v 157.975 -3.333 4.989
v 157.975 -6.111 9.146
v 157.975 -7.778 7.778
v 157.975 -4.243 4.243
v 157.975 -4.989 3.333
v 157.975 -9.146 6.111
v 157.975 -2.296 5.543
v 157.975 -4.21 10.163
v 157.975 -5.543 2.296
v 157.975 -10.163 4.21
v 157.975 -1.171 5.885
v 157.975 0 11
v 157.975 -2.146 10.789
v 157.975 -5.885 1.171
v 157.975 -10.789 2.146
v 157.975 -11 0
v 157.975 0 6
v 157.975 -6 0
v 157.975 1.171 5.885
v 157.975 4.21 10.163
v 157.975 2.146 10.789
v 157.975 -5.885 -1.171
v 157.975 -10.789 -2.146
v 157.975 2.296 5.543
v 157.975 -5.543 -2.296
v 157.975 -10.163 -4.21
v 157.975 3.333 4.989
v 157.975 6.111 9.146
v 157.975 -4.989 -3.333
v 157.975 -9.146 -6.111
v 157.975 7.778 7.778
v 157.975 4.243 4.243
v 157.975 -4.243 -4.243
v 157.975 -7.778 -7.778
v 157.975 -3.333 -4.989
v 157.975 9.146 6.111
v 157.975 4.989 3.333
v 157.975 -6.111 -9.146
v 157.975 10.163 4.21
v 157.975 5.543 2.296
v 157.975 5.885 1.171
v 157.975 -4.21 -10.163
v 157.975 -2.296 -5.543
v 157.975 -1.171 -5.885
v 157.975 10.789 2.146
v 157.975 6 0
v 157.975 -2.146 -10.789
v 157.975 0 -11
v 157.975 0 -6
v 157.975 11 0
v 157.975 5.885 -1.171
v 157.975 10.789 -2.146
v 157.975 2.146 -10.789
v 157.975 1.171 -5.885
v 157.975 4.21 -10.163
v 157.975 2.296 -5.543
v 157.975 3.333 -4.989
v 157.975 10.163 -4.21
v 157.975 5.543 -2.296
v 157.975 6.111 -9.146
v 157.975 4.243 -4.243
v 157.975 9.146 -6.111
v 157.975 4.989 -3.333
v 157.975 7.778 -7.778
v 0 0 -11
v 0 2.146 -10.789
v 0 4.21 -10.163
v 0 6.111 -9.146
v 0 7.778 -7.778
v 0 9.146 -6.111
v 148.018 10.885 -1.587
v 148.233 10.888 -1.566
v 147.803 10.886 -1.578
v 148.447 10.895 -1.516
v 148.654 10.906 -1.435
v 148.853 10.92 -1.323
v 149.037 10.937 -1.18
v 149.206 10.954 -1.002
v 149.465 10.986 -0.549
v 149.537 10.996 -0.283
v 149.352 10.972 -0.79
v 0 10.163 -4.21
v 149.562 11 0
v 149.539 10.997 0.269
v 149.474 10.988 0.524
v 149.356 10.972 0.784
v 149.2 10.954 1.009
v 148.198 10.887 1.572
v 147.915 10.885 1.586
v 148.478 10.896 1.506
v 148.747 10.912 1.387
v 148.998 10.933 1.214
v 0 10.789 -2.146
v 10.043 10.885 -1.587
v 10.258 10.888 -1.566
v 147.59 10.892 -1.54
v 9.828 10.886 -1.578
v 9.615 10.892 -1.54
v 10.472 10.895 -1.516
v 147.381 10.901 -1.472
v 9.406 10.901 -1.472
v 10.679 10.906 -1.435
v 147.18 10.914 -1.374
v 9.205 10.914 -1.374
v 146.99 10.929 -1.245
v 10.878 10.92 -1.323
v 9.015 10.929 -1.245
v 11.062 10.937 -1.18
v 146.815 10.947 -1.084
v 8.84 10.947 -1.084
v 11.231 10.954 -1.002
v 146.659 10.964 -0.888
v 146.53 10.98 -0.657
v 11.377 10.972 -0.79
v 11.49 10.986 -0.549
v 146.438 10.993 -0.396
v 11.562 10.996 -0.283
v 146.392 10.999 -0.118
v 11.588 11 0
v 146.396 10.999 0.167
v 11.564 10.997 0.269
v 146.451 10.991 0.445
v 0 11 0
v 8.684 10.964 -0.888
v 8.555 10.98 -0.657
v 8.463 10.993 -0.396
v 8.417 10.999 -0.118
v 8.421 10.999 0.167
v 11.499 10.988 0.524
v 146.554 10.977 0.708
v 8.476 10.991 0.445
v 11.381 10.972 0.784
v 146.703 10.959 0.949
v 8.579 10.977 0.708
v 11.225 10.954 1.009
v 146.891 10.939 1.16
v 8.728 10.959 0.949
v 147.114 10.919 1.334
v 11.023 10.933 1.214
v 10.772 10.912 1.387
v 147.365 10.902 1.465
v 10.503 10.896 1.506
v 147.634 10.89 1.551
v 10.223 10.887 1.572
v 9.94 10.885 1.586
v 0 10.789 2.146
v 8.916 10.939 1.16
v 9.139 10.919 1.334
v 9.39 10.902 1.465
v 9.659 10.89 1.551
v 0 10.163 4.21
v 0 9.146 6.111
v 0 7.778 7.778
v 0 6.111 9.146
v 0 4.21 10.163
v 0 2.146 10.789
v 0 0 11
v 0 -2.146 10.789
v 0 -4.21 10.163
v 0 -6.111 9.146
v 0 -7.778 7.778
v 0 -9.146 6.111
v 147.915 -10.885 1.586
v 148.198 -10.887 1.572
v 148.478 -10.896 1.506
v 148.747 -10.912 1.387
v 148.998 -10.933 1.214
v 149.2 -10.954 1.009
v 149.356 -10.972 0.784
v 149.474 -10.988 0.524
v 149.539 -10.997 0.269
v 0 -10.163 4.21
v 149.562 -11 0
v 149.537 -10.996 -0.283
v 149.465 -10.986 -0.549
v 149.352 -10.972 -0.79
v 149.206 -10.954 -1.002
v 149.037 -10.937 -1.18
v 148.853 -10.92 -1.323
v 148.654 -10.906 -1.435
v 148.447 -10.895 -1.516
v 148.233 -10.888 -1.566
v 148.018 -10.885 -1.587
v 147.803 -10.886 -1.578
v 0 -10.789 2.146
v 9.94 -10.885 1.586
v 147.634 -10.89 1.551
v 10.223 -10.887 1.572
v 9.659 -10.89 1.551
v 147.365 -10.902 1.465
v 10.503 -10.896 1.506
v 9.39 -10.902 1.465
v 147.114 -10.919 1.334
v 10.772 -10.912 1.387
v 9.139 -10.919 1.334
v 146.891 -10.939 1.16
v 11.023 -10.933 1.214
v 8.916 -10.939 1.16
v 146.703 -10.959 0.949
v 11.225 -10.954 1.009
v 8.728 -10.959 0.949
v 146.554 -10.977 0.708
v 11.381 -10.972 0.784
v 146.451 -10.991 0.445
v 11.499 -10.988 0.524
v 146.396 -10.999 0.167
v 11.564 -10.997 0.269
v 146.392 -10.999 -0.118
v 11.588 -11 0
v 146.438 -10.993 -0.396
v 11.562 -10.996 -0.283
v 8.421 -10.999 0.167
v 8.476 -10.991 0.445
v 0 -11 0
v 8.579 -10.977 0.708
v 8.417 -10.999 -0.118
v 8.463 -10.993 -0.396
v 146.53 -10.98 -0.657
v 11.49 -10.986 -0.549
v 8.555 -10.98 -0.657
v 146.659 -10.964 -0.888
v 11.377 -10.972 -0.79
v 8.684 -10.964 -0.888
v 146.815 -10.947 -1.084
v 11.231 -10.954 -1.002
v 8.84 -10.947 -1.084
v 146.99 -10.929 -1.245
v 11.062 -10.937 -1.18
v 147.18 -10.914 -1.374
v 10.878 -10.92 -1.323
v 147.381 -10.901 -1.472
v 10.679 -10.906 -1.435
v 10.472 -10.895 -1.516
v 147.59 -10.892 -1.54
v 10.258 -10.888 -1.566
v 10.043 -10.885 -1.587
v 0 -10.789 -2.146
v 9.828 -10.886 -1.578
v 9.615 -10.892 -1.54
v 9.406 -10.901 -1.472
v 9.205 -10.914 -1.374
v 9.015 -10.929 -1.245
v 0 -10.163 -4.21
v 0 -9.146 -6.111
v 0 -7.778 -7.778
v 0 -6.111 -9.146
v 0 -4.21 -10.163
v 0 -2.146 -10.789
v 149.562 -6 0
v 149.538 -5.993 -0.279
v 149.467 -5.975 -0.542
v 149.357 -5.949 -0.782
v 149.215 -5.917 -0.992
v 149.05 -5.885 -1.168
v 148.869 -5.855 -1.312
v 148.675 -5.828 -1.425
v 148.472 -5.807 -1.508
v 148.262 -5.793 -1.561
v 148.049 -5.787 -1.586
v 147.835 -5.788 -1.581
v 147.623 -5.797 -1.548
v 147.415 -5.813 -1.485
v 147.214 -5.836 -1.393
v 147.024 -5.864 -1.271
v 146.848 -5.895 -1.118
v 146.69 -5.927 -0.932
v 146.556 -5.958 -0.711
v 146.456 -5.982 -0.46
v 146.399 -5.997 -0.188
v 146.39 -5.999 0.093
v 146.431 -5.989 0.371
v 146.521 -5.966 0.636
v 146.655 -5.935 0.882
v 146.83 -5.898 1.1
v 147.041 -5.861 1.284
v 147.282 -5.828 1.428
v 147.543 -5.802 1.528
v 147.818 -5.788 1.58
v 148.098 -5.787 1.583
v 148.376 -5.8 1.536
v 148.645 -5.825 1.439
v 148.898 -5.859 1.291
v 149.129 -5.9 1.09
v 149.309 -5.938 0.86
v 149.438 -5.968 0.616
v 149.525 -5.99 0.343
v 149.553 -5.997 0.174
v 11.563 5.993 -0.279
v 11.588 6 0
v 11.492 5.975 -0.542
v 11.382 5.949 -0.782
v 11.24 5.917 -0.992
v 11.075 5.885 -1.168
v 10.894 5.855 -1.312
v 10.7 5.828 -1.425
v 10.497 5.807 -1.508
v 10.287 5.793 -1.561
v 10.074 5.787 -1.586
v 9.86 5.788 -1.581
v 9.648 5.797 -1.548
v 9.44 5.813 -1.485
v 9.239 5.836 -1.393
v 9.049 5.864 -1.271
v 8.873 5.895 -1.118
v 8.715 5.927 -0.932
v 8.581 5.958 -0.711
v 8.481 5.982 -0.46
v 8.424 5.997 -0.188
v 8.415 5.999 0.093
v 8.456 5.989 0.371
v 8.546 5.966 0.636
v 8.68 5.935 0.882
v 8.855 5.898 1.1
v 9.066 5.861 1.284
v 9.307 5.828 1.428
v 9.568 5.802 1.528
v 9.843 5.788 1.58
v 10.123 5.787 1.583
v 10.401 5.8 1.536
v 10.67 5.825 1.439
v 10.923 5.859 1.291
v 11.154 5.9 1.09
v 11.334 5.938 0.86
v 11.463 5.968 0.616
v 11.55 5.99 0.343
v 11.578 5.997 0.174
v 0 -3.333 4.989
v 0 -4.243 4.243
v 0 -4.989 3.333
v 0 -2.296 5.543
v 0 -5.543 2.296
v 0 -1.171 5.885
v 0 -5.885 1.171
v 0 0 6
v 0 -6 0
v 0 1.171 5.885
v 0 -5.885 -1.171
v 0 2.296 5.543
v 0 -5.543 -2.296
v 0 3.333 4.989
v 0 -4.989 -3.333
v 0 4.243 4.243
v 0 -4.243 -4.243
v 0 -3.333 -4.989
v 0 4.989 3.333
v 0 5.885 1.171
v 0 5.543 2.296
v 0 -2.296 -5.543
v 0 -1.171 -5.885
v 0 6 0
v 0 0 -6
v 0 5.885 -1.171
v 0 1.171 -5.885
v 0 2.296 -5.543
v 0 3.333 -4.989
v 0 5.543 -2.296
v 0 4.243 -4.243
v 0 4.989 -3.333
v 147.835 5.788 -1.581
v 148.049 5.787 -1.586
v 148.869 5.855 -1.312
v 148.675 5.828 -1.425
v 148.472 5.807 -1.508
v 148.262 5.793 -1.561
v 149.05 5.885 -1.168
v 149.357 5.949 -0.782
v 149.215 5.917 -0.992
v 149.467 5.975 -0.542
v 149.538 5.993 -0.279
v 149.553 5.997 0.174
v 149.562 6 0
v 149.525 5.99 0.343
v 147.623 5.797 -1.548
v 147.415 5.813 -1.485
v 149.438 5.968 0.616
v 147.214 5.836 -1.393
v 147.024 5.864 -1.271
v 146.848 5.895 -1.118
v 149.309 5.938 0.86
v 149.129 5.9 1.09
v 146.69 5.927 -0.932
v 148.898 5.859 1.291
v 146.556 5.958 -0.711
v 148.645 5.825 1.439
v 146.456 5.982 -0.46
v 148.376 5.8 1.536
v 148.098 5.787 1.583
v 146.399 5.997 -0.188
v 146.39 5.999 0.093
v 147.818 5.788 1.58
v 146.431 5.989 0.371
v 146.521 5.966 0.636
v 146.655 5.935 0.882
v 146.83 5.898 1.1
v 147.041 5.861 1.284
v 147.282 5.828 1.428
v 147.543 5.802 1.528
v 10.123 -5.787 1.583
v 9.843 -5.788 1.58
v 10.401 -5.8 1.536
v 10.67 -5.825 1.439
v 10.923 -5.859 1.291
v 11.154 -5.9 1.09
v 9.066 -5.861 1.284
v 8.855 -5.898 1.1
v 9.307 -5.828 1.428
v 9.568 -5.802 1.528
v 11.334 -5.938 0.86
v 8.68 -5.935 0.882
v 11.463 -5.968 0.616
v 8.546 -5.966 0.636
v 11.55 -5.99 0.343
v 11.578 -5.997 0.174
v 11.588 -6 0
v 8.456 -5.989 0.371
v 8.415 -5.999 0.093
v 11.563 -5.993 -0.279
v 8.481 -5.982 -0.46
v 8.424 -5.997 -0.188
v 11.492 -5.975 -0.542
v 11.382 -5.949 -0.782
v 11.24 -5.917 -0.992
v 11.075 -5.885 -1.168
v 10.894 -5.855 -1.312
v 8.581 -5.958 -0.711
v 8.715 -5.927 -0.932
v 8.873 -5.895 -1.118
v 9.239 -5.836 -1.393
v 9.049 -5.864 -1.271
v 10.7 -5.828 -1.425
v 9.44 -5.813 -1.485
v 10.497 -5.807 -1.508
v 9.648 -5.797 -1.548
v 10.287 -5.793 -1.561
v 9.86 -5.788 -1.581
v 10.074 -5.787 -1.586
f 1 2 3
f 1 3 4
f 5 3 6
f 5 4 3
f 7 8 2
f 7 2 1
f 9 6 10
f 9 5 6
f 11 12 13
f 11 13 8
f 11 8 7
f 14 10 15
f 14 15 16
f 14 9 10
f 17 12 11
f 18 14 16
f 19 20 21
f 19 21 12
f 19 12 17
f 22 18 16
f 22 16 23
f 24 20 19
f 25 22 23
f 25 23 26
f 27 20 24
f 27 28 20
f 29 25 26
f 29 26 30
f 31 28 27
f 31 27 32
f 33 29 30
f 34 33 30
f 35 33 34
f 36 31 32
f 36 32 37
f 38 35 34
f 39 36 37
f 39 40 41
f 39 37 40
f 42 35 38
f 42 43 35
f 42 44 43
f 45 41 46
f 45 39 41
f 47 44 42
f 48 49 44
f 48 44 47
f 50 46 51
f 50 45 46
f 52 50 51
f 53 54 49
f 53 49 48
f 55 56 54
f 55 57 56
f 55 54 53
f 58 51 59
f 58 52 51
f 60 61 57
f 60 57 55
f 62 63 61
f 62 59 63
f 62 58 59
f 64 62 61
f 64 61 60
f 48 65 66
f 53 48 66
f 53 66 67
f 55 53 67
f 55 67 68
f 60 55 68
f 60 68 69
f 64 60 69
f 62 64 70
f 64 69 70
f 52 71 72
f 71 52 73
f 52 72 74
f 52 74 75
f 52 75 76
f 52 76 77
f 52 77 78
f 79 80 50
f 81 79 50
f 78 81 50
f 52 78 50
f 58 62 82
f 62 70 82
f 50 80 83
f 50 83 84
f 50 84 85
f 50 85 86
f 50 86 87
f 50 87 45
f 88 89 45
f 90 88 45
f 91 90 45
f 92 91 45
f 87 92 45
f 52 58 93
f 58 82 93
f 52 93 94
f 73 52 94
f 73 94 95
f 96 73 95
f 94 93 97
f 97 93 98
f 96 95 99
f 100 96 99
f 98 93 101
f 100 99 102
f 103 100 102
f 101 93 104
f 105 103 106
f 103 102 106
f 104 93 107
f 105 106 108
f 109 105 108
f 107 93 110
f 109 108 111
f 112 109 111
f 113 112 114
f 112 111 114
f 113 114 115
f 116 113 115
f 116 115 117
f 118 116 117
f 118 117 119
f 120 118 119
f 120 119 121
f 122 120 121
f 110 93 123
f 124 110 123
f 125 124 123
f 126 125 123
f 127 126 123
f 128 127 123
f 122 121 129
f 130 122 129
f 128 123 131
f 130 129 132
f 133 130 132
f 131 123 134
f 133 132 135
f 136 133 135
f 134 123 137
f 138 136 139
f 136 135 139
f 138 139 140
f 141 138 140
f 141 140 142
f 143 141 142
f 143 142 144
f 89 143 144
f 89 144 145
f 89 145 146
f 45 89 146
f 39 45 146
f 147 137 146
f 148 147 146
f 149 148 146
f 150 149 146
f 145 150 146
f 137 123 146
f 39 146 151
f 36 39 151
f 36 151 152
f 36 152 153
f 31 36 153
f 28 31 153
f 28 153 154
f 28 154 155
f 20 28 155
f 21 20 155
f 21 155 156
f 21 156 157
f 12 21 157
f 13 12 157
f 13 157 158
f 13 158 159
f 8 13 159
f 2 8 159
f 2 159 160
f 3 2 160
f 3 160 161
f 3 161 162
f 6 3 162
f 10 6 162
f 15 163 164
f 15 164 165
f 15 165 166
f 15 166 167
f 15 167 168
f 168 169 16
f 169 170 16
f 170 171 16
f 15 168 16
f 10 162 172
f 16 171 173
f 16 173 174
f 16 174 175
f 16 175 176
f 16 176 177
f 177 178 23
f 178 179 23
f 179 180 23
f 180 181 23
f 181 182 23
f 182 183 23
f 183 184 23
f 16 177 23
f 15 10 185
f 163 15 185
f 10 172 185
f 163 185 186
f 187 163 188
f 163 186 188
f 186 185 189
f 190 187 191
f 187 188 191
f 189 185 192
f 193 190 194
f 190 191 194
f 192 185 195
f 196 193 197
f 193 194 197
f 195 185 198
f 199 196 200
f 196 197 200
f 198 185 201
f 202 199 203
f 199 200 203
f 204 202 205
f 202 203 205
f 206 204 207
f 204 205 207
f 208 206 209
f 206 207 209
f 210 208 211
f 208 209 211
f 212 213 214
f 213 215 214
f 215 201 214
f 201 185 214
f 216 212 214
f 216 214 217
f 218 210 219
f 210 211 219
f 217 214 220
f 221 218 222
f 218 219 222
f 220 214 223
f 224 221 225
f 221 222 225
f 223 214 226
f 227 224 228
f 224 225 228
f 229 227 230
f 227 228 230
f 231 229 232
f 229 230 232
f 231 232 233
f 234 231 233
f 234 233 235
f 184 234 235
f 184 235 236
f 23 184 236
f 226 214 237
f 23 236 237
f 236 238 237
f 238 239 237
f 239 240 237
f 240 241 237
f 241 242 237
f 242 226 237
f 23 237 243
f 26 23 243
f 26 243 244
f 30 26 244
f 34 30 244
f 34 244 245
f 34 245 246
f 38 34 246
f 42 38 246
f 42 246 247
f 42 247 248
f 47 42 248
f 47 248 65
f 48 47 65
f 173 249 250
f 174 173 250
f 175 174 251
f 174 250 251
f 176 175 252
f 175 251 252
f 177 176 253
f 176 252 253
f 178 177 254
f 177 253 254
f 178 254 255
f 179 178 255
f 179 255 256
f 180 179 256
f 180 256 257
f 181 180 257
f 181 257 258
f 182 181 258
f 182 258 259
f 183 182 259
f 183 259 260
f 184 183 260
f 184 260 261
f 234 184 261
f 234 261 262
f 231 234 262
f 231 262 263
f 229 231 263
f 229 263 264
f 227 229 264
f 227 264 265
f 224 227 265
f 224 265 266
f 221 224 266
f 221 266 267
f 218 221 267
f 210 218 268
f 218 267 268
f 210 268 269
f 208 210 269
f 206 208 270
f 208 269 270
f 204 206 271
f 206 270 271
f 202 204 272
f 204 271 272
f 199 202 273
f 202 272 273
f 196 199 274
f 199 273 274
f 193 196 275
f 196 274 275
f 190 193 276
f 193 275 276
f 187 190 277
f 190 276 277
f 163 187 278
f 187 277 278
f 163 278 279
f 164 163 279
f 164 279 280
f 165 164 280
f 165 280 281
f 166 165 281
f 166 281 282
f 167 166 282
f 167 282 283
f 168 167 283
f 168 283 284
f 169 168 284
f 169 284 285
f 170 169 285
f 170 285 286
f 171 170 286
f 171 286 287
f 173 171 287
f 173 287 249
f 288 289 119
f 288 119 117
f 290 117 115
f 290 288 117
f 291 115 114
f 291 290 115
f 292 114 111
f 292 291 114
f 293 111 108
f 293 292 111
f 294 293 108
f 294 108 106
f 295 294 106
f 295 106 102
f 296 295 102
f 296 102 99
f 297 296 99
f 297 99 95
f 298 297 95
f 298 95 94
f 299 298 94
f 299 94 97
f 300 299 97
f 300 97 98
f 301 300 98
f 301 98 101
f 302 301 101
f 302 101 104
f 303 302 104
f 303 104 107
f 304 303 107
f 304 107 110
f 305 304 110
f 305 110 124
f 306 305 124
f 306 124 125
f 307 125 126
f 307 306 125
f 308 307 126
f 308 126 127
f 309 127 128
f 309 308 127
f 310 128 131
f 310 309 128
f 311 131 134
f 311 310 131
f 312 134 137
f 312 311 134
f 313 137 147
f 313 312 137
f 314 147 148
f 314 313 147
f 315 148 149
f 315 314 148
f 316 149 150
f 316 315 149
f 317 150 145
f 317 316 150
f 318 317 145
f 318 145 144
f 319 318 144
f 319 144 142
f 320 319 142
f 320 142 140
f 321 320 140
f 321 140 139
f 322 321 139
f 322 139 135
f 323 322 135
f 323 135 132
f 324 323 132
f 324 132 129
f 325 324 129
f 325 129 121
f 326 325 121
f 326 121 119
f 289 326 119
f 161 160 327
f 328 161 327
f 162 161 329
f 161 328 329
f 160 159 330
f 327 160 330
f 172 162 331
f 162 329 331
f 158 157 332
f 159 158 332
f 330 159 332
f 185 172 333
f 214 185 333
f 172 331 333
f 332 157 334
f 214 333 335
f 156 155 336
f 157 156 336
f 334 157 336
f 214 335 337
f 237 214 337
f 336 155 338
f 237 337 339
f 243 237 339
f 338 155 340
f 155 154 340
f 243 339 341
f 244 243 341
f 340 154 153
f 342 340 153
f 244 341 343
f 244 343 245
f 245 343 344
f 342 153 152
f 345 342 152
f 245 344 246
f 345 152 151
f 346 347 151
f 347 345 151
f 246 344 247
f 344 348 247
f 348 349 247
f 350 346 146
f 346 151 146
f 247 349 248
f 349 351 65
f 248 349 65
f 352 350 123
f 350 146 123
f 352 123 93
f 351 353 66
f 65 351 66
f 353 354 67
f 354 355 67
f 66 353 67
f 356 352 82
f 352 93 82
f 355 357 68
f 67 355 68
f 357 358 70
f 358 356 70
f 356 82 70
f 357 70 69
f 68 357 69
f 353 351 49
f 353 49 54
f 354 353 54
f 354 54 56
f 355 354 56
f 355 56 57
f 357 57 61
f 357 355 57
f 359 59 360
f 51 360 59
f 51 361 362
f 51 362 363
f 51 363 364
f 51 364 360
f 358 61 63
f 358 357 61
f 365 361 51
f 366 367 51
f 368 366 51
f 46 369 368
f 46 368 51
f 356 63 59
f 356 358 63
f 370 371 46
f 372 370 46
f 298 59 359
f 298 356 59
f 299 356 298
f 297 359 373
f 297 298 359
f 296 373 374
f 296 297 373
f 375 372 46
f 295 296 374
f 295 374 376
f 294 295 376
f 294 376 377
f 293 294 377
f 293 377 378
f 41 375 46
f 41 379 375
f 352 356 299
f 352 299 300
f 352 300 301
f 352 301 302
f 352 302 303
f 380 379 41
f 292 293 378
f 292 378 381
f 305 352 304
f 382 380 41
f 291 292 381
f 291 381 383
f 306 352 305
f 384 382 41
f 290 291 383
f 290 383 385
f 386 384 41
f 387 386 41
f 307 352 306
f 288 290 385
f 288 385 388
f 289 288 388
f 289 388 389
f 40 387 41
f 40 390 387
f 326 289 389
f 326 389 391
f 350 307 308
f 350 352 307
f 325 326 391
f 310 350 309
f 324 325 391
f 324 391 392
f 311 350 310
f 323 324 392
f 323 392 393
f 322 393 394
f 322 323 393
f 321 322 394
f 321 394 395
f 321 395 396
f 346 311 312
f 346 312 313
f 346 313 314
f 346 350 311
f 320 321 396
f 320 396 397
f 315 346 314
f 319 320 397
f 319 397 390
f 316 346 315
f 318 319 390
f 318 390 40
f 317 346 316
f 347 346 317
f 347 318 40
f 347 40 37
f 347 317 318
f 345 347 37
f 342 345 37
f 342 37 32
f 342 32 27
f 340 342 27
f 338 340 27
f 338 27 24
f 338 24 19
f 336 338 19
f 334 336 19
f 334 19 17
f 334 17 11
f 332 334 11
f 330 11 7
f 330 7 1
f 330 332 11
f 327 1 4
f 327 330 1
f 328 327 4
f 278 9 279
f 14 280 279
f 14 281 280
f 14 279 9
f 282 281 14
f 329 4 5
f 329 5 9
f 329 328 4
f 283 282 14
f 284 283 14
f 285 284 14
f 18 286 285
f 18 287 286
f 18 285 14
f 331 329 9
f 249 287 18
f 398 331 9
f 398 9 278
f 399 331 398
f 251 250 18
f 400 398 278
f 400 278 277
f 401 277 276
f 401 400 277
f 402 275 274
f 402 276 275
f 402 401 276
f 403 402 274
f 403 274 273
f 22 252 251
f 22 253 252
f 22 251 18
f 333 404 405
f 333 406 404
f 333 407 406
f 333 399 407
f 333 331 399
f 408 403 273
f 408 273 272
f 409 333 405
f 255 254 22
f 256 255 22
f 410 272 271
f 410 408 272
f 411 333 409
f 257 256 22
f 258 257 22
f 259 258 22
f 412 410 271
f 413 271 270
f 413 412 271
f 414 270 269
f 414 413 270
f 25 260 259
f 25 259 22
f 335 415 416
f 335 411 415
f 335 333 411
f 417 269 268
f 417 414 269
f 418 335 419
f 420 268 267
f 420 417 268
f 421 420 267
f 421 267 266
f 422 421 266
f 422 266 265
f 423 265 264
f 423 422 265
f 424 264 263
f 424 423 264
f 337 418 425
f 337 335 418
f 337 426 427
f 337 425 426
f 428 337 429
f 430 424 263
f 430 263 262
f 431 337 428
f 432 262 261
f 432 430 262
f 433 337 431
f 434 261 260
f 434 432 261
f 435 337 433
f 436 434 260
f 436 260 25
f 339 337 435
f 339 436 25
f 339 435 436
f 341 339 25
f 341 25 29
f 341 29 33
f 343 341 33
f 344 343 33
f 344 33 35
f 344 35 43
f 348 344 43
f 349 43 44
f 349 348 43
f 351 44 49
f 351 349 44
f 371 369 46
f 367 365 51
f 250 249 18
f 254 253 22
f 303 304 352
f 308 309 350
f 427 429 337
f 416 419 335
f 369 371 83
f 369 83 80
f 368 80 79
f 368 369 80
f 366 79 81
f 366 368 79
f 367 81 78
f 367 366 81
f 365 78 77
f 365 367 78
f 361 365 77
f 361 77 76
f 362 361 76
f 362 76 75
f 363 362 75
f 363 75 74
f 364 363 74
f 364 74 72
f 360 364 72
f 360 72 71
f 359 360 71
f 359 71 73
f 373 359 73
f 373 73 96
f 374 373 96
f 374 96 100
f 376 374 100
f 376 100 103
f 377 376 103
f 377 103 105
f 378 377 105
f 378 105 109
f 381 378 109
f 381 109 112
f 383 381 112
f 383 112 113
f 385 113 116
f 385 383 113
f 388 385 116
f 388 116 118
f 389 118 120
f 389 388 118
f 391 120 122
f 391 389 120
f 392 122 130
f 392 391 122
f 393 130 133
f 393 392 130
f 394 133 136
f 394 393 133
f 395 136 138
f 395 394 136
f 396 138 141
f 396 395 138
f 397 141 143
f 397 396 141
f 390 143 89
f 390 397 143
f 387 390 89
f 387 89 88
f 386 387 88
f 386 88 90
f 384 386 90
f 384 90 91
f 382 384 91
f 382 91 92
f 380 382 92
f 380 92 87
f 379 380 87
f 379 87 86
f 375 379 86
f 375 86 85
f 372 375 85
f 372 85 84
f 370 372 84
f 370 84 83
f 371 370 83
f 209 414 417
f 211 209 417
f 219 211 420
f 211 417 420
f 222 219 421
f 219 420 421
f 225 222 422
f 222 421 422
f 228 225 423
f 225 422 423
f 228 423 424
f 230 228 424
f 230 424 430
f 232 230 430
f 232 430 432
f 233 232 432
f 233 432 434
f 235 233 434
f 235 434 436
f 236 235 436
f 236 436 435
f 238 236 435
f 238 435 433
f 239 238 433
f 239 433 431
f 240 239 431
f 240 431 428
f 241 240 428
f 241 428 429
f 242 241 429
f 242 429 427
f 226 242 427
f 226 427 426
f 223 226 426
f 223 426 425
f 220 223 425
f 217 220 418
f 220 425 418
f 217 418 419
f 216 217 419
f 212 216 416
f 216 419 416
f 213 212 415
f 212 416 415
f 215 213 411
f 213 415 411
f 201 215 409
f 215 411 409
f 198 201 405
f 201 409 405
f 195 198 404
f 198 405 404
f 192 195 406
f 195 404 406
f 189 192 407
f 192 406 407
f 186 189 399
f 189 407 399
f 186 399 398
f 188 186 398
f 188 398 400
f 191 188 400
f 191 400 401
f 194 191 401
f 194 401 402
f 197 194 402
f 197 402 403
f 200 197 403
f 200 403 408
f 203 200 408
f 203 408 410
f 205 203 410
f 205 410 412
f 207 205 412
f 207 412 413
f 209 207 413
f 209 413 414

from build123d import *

# Parameters (mm, degrees)
SKETCH2_R               = 11
SKETCH2_R_2             = 6
BOSS_EXTRUDE1_DEPTH     = 157.975
SKETCH3_R               = 1.5875
CUT_EXTRUDE1_DEPTH      = 12
CUT_EXTRUDE1_DEPTH_BACK = 12


with BuildPart() as part:
    # Sketch2 → Boss-Extrude1 (new body)
    with BuildSketch(Plane(origin=(0, 0, 0), x_dir=(0, 0, -1), z_dir=(1, 0, 0))):
        Circle(SKETCH2_R)
        Circle(SKETCH2_R_2, mode=Mode.SUBTRACT)
    extrude(amount=BOSS_EXTRUDE1_DEPTH)

    # Sketch3 → Cut-Extrude1 (cut, two sides)
    with BuildSketch(Plane(origin=(0, 0, 0), x_dir=(1, 0, 0), z_dir=(0, 1, 0))) as cut_extrude1_sk:
        with Locations((10, 0)):
            Circle(SKETCH3_R)
        with Locations((147.975, 0)):
            Circle(SKETCH3_R)
    extrude(amount=CUT_EXTRUDE1_DEPTH, mode=Mode.SUBTRACT)
    extrude(cut_extrude1_sk.sketch, amount=-CUT_EXTRUDE1_DEPTH_BACK, mode=Mode.SUBTRACT)


solid = part.part
